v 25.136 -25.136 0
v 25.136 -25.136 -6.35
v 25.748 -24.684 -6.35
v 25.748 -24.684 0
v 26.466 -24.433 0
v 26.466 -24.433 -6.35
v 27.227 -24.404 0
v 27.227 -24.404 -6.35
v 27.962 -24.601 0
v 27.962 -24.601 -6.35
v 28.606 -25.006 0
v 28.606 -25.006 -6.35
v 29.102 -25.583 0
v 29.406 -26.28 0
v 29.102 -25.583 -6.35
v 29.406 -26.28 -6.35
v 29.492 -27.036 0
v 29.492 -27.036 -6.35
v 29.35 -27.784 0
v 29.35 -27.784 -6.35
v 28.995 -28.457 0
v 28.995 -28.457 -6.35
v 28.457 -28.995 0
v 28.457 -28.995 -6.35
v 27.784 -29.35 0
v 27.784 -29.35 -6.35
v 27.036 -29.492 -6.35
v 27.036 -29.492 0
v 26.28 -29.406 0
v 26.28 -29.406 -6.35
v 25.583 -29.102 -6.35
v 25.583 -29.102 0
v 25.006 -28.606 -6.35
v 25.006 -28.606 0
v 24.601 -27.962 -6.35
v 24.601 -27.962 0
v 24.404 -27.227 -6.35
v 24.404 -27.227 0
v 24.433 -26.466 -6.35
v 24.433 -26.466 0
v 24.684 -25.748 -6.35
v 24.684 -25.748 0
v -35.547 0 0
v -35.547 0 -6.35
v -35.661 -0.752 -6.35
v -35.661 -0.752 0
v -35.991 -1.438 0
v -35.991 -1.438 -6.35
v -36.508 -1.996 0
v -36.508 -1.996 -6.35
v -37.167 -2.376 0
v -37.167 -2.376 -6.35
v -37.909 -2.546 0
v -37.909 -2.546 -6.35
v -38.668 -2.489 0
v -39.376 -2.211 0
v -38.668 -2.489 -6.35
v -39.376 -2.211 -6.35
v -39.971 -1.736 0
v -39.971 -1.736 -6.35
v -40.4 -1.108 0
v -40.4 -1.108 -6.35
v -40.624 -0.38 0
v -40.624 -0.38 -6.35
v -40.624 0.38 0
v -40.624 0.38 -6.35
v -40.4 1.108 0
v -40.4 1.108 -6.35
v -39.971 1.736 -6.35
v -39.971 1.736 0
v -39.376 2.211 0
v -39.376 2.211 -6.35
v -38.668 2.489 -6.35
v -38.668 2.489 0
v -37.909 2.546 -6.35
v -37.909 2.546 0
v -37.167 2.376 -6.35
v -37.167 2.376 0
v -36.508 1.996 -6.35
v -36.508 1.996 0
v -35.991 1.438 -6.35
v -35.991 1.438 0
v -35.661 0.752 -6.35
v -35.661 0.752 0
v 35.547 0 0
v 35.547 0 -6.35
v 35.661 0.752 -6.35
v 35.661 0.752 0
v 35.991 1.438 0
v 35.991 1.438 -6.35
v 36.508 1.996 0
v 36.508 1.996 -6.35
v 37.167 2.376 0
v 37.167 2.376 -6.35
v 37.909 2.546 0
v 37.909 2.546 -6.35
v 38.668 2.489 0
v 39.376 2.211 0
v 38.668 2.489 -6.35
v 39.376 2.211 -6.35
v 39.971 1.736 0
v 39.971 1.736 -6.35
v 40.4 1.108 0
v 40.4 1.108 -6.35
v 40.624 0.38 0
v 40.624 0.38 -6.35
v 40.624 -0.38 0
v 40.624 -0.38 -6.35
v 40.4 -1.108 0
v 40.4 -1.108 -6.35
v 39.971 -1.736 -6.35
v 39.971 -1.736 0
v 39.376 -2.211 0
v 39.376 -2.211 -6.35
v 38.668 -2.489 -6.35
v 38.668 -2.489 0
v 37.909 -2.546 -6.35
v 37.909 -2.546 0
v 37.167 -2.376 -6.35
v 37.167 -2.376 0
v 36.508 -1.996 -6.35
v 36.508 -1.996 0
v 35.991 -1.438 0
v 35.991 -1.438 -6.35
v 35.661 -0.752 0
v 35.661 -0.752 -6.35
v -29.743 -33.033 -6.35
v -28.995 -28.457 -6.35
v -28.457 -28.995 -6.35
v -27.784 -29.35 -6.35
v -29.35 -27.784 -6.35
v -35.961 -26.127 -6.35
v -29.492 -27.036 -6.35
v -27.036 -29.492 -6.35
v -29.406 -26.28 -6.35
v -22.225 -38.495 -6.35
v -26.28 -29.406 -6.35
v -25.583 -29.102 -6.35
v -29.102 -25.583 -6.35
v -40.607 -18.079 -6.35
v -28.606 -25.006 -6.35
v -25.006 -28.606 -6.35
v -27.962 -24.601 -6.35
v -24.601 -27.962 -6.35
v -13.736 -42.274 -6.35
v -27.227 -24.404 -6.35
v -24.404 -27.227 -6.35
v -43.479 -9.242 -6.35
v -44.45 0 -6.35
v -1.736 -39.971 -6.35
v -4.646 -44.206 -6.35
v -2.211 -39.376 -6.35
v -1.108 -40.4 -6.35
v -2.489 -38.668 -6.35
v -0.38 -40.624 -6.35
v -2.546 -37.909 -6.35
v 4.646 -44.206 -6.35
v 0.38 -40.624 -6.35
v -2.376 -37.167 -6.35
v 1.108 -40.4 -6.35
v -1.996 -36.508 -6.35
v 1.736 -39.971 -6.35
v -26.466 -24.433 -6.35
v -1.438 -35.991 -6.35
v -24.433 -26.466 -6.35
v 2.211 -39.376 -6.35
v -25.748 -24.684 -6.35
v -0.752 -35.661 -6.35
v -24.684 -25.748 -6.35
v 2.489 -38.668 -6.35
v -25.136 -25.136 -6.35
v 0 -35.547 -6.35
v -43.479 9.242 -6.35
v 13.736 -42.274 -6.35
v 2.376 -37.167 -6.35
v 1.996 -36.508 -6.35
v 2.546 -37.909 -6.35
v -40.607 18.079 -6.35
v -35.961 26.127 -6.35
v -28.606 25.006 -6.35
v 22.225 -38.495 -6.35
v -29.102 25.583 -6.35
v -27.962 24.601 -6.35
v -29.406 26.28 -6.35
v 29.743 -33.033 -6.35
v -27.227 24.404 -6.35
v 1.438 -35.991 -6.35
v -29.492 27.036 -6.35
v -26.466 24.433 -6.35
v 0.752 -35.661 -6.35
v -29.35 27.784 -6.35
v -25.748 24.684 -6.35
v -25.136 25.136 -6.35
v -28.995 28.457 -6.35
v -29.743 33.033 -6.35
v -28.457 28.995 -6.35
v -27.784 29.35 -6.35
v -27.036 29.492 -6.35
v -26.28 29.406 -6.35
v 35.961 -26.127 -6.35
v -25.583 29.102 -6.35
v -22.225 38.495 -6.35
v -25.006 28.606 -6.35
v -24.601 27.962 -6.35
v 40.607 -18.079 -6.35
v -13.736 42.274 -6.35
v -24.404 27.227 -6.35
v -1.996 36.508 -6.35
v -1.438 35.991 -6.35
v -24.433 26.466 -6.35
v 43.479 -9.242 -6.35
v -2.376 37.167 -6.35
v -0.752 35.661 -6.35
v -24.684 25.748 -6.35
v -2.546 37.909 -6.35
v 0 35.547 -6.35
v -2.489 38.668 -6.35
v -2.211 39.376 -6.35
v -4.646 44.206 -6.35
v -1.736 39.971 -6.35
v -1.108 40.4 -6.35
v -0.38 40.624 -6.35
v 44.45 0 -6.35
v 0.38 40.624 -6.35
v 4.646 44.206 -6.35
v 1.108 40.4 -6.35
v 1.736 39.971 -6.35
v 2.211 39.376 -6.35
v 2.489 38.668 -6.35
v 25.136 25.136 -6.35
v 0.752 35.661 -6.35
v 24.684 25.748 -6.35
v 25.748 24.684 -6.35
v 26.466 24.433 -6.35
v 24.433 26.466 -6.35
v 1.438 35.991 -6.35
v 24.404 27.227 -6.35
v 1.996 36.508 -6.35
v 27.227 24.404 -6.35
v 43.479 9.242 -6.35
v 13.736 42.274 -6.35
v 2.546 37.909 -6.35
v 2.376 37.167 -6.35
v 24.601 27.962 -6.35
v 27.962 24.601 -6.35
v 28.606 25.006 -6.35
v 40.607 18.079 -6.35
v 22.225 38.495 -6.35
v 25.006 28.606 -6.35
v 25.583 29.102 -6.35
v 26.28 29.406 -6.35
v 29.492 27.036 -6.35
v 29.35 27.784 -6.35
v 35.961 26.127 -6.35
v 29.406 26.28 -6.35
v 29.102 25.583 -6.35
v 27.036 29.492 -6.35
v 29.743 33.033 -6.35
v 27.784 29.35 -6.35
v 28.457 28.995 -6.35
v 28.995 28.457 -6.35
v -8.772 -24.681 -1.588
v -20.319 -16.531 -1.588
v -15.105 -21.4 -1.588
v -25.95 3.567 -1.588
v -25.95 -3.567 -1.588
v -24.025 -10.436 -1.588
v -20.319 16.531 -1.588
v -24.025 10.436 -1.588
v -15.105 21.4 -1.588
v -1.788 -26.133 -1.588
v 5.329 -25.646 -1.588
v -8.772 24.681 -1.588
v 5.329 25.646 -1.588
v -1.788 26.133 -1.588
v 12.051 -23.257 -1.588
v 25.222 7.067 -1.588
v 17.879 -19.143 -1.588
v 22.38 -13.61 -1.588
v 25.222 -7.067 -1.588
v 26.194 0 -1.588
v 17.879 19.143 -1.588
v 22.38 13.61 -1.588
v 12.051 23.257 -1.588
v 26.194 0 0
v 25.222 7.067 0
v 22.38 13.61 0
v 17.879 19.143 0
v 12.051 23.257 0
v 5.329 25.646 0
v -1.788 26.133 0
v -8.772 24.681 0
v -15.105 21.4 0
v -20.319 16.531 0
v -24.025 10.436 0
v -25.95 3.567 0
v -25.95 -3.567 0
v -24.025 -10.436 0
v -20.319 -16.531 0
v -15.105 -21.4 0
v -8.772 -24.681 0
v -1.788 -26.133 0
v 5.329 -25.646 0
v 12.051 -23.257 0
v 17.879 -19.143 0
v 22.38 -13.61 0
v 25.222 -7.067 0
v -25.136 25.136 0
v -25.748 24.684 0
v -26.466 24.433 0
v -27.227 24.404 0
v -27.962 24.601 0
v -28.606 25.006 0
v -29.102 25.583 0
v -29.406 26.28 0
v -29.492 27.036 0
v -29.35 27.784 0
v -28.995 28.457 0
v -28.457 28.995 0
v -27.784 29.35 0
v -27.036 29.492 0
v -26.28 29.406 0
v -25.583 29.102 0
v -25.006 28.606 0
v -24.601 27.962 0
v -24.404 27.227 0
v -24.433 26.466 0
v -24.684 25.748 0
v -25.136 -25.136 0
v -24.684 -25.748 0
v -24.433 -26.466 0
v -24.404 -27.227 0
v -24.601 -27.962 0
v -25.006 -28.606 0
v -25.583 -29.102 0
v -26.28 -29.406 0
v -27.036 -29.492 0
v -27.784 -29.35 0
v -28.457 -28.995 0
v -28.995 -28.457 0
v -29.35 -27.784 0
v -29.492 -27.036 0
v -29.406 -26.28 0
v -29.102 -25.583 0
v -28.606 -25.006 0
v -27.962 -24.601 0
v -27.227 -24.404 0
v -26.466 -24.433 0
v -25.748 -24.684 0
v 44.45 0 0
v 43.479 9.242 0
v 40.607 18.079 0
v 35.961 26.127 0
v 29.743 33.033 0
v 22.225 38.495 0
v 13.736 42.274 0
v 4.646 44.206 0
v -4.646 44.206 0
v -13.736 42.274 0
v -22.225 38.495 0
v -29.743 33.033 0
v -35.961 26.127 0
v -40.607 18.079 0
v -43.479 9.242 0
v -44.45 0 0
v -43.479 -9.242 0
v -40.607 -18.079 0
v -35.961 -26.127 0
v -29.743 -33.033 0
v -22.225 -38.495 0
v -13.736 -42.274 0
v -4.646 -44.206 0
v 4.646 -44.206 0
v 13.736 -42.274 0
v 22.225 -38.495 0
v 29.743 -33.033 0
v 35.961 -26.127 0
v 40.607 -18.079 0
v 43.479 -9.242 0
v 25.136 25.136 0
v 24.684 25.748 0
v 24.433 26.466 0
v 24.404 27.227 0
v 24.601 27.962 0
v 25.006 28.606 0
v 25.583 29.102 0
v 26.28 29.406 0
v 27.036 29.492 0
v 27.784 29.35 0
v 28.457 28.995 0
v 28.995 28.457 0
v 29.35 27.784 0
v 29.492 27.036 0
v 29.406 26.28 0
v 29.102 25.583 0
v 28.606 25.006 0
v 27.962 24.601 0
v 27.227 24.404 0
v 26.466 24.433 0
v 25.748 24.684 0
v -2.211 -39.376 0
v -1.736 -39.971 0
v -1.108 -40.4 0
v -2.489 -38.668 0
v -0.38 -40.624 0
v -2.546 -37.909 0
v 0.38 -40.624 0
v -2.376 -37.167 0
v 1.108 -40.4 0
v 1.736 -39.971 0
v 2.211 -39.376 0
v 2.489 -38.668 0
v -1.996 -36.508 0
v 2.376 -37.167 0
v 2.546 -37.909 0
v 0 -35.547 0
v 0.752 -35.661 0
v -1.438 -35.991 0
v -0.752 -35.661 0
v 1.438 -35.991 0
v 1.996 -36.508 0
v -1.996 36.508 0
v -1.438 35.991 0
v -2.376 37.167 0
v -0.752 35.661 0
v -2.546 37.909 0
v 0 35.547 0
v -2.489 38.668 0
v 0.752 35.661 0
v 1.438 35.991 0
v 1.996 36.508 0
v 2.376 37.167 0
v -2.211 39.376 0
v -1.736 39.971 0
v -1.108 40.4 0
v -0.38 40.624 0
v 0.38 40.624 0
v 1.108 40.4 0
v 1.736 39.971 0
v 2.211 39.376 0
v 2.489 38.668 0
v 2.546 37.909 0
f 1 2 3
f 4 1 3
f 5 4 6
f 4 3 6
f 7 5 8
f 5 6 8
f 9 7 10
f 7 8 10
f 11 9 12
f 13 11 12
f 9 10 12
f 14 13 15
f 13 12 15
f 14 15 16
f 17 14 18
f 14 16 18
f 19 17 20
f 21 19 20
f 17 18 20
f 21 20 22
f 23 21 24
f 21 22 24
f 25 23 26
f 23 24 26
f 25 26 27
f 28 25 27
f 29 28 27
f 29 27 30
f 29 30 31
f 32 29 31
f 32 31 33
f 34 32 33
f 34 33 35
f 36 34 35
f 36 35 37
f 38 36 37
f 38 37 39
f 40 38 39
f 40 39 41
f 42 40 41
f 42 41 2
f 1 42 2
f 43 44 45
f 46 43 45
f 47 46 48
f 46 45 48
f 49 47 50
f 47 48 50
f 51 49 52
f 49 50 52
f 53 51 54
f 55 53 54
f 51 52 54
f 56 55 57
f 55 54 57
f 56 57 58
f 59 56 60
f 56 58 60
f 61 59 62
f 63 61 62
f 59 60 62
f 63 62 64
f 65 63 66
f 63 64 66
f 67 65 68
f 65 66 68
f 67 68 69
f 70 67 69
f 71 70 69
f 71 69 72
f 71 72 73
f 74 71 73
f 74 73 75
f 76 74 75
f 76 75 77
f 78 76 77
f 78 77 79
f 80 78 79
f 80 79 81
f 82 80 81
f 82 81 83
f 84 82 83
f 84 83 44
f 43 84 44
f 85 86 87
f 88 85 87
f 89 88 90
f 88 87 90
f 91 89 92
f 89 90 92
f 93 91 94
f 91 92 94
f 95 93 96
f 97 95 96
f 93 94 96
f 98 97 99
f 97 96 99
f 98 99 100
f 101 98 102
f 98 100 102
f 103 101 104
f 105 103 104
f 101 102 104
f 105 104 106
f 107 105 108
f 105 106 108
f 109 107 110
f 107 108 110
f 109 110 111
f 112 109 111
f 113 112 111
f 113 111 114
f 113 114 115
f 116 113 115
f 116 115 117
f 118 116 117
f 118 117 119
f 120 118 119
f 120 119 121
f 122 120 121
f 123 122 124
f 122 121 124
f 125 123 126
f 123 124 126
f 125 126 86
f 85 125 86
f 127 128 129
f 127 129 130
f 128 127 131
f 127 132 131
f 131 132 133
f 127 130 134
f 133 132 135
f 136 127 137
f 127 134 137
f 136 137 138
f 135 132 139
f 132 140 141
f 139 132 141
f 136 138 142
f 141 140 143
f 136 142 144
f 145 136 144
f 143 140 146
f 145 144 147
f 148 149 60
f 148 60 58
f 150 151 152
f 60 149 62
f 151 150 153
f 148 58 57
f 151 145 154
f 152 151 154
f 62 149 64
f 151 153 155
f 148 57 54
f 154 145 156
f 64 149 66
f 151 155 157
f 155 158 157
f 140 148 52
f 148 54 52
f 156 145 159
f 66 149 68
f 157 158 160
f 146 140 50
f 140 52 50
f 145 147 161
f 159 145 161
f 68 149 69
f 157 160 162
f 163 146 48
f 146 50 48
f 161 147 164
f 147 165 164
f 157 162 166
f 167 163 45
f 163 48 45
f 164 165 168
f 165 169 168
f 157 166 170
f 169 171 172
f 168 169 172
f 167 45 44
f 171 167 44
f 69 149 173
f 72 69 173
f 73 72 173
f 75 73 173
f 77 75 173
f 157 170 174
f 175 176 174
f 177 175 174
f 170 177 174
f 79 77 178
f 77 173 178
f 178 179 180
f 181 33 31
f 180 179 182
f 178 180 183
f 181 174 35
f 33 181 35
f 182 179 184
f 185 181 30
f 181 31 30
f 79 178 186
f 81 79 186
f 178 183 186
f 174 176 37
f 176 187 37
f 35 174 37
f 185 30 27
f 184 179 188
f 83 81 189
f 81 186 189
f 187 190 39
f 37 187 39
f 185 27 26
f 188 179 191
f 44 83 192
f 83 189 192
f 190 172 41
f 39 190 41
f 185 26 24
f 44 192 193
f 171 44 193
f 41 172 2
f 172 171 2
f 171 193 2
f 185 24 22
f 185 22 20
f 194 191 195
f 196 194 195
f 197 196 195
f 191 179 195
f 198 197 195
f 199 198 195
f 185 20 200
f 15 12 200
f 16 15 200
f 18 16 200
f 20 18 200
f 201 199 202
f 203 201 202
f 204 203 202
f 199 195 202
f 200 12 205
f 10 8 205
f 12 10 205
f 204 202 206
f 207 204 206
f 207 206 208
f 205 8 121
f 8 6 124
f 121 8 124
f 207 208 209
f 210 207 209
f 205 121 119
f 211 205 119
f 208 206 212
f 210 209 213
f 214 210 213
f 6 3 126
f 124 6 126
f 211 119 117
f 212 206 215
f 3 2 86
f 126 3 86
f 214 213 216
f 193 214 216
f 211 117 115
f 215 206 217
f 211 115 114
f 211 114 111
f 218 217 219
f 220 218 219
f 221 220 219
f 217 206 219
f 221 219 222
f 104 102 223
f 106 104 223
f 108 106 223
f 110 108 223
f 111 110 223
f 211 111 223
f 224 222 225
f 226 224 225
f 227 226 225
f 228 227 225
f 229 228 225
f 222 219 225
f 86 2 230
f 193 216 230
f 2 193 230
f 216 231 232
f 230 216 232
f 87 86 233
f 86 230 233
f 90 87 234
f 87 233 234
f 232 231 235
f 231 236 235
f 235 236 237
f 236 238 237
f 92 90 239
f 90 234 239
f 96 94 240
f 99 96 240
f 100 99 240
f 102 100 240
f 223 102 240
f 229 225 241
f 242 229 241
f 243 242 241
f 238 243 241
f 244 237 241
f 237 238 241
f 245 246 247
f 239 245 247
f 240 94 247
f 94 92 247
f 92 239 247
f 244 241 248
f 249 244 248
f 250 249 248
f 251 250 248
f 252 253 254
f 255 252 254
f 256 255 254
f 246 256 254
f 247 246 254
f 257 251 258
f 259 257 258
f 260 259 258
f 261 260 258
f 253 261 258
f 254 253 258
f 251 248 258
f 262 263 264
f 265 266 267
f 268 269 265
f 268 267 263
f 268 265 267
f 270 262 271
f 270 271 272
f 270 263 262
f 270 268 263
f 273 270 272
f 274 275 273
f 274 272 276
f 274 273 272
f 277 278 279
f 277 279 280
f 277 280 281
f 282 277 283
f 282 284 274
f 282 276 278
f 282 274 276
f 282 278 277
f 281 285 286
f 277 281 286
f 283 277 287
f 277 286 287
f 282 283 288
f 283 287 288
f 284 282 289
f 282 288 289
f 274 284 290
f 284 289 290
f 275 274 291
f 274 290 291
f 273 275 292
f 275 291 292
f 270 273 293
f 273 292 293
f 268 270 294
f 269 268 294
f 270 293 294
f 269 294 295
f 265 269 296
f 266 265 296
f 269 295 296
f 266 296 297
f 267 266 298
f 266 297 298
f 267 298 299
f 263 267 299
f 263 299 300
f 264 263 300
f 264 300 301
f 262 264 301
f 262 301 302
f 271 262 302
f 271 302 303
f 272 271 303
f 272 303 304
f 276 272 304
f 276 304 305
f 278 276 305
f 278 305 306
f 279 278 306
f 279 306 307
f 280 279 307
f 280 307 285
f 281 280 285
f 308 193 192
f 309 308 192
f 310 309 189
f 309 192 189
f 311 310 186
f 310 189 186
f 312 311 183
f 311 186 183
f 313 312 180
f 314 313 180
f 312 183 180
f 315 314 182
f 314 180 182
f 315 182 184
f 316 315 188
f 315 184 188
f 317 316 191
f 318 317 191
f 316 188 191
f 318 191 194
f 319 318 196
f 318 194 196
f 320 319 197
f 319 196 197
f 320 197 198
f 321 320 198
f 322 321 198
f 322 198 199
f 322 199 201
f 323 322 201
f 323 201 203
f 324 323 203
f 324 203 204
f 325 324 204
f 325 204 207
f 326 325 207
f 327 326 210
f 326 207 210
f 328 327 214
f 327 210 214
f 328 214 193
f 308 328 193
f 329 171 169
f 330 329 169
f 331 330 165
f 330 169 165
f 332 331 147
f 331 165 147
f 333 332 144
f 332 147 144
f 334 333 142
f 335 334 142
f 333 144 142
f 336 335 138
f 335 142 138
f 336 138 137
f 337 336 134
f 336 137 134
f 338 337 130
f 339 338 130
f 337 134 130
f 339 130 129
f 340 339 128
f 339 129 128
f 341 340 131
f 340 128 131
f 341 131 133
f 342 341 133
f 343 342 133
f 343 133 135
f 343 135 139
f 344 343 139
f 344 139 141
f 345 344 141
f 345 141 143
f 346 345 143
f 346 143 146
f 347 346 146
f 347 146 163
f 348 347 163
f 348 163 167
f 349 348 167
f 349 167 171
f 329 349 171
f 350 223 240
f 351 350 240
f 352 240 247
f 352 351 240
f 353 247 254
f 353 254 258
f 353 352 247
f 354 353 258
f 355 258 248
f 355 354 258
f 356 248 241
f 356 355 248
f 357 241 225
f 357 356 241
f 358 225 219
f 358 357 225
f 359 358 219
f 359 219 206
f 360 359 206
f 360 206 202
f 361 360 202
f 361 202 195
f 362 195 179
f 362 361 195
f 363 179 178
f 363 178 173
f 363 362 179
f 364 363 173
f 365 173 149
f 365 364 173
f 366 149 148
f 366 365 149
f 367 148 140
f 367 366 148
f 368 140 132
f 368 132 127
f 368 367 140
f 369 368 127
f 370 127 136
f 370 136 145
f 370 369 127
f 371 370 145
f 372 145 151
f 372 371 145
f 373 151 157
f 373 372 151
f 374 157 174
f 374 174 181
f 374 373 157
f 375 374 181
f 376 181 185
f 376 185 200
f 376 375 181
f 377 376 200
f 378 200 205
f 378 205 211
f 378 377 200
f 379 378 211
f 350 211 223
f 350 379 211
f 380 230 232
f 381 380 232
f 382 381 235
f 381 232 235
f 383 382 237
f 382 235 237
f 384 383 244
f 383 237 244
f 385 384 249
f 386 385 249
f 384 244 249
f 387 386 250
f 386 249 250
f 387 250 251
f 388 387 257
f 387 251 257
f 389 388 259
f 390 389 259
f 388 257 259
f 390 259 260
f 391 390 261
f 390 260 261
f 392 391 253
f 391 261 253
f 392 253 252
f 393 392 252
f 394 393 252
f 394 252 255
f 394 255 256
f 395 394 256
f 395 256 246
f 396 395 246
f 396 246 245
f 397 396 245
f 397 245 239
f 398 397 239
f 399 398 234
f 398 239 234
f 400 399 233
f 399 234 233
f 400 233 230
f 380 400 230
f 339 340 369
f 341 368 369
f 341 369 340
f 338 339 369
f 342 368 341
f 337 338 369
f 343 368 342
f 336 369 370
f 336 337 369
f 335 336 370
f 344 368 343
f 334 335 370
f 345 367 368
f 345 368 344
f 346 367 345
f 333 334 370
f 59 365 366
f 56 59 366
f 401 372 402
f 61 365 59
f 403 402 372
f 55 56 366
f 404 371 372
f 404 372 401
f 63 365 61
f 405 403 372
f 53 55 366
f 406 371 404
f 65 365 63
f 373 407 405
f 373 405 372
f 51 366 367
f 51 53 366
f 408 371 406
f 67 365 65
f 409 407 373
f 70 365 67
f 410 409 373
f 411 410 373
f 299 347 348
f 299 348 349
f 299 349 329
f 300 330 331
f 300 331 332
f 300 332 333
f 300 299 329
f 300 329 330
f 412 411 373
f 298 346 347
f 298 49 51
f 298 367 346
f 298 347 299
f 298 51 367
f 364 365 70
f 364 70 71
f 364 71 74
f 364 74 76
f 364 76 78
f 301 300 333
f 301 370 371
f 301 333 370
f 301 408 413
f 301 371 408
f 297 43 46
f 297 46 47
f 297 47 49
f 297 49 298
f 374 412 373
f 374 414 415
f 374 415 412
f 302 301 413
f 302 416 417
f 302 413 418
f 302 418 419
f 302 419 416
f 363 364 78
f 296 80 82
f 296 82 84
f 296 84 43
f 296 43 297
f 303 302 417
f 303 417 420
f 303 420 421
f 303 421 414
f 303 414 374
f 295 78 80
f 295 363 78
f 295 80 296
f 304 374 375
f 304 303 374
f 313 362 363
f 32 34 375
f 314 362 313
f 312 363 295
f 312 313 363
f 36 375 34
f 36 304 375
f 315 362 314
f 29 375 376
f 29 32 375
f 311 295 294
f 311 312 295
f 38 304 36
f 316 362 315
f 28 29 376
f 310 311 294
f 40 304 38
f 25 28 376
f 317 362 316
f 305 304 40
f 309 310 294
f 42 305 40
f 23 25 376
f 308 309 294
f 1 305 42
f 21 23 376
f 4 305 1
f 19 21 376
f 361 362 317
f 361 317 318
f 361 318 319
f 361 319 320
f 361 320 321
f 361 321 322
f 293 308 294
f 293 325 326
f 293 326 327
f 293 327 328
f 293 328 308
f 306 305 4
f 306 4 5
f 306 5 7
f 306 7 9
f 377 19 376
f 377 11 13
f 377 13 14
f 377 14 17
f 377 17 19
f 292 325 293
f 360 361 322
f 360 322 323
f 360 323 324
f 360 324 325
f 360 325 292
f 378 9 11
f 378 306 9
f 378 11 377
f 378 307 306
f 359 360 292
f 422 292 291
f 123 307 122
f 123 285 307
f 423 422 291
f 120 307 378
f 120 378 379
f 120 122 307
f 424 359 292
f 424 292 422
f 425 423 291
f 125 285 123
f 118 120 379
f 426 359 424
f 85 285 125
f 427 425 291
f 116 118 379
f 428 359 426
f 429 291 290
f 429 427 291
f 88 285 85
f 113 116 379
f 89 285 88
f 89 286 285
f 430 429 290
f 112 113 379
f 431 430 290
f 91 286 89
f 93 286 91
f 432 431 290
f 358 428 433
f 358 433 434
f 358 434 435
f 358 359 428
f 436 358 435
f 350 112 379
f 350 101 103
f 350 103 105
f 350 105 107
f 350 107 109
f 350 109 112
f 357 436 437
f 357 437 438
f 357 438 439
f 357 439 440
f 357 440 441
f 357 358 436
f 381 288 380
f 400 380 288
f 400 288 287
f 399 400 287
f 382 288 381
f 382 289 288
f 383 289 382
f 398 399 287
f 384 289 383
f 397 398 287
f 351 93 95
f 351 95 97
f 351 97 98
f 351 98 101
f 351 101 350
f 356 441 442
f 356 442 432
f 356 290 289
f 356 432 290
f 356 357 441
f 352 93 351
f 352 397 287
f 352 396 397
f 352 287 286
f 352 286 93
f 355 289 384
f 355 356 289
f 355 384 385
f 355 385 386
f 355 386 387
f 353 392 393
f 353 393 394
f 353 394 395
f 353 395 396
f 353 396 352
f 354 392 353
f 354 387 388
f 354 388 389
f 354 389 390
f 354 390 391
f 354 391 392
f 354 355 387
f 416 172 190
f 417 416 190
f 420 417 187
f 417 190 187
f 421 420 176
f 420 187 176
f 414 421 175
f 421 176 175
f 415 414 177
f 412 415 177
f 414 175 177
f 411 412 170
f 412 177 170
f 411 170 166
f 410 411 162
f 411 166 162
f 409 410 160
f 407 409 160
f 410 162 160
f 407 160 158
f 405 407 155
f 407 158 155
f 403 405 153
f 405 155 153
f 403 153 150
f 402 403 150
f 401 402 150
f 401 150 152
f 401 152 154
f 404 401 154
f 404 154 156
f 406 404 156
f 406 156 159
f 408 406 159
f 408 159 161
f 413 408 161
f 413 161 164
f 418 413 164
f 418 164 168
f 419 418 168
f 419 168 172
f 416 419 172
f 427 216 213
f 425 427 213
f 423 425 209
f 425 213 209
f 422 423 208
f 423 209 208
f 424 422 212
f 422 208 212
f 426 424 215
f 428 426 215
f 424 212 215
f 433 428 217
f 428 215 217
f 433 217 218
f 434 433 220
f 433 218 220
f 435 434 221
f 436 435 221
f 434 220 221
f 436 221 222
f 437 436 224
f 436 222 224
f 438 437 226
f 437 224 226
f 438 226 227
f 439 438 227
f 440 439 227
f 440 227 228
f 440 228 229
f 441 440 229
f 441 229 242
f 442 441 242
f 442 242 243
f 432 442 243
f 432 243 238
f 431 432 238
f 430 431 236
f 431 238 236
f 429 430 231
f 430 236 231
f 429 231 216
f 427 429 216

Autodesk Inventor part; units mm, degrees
ref_plane "YZ Plane" through (0, 0, 0) normal (1, 0, 0) x (0, 1, 0)
ref_plane "XZ Plane" through (0, 0, 0) normal (0, 1, 0) x (-1, 0, 0)
ref_plane "XY Plane" through (0, 0, 0) normal (0, 0, 1) x (1, 0, 0)
sketch "Sketch1" plane through (0, 0, 0) normal (0, 0, 1) x (1, 0, 0)
  circle A0 centre (0, 0) radius 44.45
  dimension "d0" = 88.9
extrude "Extrusion1" add sketch "Sketch1" against normal blind 6.35
sketch "Sketch2" plane through (0, 0, 0) normal (0, 0, 1) x (1, 0, 0)
  circle A0 centre (0, 0) radius 44.45 construction
  circle A1 centre (0, 0) radius 38.1 construction
  point P0 (0, 38.1)
  dimension "d3" = 76.2
hole "Hole1" at (0, 38.1, 0) direction (0, 0, -1) diameter 5.1054 end through all clearance for "Flat Head Machine Screw (82)" size "#10" standard "Ansi Unified Screw Threads"
pattern_circular "Circular Pattern1" count 8 over 360 about axis through (0, 0, 0) along (0, 0, -1) of "Hole1"
sketch "Sketch3" plane through (0, 0, 0) normal (0, 0, 1) x (1, 0, 0)
  circle A0 centre (0, 0) radius 26.1938
  dimension "d14" = 52.3875
extrude "Extrusion2" cut sketch "Sketch3" against normal blind 1.5875
properties part number "EL2-A-003" material "Aluminum 6061"
